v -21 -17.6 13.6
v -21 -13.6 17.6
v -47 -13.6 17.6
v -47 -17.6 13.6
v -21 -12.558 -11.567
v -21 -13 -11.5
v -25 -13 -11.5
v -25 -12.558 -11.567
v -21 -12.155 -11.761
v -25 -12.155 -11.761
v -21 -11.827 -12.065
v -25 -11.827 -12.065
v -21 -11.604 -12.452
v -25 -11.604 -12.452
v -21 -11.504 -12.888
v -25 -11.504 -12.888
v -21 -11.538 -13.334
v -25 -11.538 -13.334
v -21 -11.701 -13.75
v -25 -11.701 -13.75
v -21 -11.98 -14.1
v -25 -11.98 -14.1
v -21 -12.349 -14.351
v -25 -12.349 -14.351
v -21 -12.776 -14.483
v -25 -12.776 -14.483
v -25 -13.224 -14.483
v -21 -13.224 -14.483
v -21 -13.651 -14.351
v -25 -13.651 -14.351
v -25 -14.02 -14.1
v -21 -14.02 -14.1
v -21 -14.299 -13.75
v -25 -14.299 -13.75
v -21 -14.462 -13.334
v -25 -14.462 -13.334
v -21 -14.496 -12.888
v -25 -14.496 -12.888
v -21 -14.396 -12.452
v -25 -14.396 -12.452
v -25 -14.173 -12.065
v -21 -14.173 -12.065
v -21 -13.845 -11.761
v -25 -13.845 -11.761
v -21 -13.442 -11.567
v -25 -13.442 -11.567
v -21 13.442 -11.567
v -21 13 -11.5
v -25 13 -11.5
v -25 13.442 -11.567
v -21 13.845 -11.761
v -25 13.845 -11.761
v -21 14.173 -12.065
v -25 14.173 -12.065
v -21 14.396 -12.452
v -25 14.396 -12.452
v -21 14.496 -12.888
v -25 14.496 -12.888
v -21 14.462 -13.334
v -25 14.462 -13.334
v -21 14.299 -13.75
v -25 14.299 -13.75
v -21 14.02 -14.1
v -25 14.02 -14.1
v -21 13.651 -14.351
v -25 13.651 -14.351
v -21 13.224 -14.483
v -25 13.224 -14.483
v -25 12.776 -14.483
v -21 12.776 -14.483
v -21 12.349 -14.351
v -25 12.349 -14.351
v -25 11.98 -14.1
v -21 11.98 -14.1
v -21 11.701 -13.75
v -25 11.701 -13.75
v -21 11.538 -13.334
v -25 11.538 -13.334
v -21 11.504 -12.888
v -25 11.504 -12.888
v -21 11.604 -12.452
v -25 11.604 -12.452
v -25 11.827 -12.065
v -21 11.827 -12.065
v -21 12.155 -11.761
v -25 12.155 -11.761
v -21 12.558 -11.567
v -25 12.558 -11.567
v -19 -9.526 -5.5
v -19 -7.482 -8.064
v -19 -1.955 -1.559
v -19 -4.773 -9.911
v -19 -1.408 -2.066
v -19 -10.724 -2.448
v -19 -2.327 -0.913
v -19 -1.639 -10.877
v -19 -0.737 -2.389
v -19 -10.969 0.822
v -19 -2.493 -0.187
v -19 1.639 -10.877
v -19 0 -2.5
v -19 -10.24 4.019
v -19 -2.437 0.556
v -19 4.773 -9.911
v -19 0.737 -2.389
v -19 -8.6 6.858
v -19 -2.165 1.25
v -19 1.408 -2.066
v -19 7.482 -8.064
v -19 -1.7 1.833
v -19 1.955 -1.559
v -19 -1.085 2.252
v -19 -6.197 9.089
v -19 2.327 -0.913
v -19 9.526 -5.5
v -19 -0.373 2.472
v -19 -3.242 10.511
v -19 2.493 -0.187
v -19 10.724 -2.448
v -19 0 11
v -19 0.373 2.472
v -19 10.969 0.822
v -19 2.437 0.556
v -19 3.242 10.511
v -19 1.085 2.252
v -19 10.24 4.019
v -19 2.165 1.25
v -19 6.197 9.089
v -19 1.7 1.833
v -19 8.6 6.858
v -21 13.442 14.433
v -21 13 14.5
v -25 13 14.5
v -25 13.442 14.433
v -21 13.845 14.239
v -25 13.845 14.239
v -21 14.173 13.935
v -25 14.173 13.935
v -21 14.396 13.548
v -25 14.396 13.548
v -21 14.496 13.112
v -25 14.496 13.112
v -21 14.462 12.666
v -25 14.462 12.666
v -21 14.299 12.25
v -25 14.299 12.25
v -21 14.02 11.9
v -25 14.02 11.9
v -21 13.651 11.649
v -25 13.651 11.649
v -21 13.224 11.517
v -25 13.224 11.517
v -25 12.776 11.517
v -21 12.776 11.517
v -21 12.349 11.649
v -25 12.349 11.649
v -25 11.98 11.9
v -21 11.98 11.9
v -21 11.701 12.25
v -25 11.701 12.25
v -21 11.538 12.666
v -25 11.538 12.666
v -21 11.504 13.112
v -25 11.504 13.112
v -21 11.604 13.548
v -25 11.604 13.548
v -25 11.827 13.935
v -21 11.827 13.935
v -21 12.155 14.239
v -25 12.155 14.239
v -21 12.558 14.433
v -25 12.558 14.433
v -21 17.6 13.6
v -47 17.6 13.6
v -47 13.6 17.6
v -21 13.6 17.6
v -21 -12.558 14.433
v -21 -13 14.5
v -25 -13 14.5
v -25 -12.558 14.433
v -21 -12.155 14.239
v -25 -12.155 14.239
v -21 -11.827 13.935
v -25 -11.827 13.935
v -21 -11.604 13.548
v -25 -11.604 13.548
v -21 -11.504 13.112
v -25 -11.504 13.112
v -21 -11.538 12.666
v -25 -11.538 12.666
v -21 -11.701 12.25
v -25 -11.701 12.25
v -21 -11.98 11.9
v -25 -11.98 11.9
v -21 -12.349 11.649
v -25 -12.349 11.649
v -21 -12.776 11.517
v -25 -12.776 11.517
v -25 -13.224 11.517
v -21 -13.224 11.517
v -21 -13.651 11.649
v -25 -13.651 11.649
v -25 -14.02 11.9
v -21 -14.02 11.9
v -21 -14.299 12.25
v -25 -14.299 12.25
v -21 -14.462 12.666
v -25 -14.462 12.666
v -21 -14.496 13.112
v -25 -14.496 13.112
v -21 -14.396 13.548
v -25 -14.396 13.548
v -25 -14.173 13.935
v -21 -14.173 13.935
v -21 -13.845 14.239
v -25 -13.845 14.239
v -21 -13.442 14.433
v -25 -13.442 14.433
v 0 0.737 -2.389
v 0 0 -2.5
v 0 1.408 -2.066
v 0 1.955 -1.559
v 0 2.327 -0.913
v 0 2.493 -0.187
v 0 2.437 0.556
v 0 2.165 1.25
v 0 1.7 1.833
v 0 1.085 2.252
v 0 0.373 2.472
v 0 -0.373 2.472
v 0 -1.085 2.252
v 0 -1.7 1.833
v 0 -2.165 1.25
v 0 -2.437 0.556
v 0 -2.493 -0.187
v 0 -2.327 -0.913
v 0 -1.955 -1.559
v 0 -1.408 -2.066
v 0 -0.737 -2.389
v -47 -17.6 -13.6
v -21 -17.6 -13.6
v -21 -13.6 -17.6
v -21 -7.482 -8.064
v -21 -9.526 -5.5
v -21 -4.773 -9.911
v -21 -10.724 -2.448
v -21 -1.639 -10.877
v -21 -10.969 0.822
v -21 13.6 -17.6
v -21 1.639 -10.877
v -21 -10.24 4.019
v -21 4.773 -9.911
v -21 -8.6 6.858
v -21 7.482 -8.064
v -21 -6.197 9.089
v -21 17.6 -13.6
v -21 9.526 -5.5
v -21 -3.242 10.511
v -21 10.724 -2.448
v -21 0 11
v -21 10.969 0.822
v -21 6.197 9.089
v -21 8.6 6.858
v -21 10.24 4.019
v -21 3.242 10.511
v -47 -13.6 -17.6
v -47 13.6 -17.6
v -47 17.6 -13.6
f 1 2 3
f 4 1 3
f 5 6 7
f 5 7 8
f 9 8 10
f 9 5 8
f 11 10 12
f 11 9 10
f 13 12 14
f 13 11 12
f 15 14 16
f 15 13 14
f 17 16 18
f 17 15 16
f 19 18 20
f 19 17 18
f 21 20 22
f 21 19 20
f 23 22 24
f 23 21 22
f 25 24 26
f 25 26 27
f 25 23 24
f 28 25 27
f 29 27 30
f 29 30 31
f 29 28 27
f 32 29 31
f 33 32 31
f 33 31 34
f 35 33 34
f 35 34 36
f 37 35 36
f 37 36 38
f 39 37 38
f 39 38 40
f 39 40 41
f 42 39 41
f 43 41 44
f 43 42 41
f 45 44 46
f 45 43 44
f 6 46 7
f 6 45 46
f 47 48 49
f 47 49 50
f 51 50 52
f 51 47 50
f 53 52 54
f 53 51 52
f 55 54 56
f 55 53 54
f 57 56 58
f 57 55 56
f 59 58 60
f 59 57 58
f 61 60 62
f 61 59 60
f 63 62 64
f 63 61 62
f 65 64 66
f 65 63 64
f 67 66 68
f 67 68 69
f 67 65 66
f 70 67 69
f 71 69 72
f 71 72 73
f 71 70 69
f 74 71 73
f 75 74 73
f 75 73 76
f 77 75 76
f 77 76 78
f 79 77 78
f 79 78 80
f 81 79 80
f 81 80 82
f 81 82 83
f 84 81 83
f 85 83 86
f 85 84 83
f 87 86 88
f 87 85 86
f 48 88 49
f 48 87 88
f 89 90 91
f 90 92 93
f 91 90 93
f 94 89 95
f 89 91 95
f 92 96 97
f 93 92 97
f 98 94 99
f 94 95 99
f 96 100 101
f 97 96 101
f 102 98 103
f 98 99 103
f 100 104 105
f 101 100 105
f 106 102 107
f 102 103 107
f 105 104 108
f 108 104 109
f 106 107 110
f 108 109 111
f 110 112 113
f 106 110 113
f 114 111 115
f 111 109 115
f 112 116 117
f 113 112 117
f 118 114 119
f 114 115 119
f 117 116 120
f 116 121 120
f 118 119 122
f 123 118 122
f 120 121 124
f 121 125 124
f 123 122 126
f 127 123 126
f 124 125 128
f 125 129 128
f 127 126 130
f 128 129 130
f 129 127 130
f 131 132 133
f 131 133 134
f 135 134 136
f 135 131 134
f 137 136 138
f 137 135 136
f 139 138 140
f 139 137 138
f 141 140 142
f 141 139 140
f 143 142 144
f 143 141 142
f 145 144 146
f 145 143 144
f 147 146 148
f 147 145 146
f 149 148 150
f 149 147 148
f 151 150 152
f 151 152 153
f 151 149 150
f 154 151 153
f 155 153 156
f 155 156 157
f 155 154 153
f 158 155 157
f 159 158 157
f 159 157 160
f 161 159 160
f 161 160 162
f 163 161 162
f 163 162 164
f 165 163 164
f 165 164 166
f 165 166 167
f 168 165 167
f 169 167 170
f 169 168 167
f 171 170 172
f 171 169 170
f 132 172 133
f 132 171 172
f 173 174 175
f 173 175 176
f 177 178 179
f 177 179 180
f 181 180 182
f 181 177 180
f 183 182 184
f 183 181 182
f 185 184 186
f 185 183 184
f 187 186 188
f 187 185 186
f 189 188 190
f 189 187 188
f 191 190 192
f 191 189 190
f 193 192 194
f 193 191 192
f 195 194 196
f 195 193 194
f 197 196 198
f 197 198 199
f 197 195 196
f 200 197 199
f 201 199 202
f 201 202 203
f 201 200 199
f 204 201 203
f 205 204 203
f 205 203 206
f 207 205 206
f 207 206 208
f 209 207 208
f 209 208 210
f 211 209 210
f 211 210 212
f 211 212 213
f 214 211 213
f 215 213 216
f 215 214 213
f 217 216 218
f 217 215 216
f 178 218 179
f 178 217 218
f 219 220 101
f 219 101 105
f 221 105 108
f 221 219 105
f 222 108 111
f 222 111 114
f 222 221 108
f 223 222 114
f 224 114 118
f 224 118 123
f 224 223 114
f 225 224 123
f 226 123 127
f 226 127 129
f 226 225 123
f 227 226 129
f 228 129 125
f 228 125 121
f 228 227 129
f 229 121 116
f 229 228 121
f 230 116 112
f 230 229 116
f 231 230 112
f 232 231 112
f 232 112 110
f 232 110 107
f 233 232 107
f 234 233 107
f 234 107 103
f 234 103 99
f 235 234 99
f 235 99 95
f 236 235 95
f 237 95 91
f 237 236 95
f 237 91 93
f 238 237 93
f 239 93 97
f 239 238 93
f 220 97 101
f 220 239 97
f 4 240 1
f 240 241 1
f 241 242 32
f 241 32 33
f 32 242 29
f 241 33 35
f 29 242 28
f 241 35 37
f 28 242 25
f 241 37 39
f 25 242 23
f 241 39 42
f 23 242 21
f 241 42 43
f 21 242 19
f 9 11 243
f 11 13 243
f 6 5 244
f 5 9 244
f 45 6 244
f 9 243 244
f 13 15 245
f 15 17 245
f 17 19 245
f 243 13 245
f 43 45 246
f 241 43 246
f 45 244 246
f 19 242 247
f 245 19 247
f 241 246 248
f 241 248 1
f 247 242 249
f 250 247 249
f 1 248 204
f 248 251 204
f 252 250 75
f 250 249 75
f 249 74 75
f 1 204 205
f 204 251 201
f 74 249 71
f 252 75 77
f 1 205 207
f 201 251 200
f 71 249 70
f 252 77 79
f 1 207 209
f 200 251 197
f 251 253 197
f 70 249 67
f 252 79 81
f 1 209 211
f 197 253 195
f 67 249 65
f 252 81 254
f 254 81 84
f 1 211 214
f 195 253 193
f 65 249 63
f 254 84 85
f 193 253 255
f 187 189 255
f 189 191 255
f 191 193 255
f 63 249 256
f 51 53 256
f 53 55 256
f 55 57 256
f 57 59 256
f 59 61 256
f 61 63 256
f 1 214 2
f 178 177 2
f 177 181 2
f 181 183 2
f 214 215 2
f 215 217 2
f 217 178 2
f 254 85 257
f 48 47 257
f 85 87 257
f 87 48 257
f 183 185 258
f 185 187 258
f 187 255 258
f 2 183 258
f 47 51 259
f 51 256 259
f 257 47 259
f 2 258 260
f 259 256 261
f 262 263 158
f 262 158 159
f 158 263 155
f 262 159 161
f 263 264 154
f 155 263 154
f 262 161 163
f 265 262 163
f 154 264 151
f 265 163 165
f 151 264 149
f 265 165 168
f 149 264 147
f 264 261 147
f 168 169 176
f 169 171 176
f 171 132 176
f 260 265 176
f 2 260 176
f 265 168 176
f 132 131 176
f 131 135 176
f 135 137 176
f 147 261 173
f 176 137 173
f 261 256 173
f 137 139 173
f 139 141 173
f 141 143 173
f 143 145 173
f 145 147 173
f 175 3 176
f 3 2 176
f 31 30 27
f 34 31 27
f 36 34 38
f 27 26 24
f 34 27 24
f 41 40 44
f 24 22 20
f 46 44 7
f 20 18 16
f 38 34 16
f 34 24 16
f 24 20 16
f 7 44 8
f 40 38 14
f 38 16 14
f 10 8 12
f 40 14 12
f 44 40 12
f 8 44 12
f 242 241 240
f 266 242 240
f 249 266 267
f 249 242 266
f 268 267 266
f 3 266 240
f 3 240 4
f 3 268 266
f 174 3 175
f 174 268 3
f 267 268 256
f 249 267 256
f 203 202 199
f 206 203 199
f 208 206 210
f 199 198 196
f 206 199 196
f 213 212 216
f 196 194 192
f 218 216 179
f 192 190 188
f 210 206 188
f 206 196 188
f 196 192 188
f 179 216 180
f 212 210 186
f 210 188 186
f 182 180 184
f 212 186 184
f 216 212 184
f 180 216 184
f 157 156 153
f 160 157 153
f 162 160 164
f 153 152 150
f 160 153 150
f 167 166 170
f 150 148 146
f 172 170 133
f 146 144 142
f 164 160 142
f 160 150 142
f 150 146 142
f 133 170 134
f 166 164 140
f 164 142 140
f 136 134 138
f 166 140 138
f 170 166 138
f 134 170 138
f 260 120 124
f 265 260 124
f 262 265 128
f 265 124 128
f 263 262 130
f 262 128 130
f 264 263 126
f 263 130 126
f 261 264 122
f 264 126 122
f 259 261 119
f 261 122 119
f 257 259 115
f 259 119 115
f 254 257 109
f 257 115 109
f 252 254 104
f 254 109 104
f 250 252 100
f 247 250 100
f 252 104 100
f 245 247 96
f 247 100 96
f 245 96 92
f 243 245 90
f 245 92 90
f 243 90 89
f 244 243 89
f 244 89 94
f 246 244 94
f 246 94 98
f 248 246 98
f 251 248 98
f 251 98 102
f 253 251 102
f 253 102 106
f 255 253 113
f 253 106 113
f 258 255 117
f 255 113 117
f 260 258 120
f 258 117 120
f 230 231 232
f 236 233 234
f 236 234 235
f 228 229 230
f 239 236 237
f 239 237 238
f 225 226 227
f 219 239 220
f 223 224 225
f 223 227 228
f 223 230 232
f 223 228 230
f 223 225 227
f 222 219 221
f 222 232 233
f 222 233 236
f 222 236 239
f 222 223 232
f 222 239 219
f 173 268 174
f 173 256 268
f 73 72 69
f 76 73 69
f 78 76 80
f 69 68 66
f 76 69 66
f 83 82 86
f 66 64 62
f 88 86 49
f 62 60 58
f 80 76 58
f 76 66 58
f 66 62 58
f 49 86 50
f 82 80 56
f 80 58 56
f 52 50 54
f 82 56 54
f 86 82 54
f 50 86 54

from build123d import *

# Parameters (mm, degrees)
SKETCH1_R           = 2.5
BOSS_EXTRUDE1_DEPTH = 19
SKETCH2_R           = 11
BOSS_EXTRUDE2_DEPTH = 2
SKETCH3_W           = 35.2
SKETCH3_H           = 35.2
SKETCH3_R           = 1.5
BOSS_EXTRUDE3_DEPTH = 4
SKETCH4_W           = 35.2
SKETCH4_H           = 35.2
BOSS_EXTRUDE4_DEPTH = 22
CHAMFER1_SIZE       = 4


with BuildPart() as part:
    # Sketch1 → Boss-Extrude1 (new body)
    with BuildSketch(Plane(origin=(0, 0, 0), x_dir=(0, 0, -1), z_dir=(1, 0, 0))):
        Circle(SKETCH1_R)
    extrude(amount=-BOSS_EXTRUDE1_DEPTH)

    # Sketch2 → Boss-Extrude2 (add)
    with BuildSketch(Plane.ZY.offset(19)):
        Circle(SKETCH2_R)
    extrude(amount=BOSS_EXTRUDE2_DEPTH)

    # Sketch3 → Boss-Extrude3 (add)
    with BuildSketch(Plane.ZY.offset(21)):
        Rectangle(SKETCH3_W, SKETCH3_H)
        with Locations((-13, 13)):
            Circle(SKETCH3_R, mode=Mode.SUBTRACT)
        with Locations((13, 13)):
            Circle(SKETCH3_R, mode=Mode.SUBTRACT)
        with Locations((13, -13)):
            Circle(SKETCH3_R, mode=Mode.SUBTRACT)
        with Locations((-13, -13)):
            Circle(SKETCH3_R, mode=Mode.SUBTRACT)
    extrude(amount=BOSS_EXTRUDE3_DEPTH)

    # Sketch4 → Boss-Extrude4 (add)
    with BuildSketch(Plane.ZY.offset(25)):
        Rectangle(SKETCH4_W, SKETCH4_H)
    extrude(amount=BOSS_EXTRUDE4_DEPTH)

    # Chamfer1
    chamfer1_edges = [part.edges().sort_by_distance(p)[0] for p in [
        (-34, -17.6, 17.6),
        (-34, 17.6, 17.6),
        (-34, 17.6, -17.6),
        (-34, -17.6, -17.6),
    ]]
    chamfer(chamfer1_edges, length=CHAMFER1_SIZE)


solid = part.part
